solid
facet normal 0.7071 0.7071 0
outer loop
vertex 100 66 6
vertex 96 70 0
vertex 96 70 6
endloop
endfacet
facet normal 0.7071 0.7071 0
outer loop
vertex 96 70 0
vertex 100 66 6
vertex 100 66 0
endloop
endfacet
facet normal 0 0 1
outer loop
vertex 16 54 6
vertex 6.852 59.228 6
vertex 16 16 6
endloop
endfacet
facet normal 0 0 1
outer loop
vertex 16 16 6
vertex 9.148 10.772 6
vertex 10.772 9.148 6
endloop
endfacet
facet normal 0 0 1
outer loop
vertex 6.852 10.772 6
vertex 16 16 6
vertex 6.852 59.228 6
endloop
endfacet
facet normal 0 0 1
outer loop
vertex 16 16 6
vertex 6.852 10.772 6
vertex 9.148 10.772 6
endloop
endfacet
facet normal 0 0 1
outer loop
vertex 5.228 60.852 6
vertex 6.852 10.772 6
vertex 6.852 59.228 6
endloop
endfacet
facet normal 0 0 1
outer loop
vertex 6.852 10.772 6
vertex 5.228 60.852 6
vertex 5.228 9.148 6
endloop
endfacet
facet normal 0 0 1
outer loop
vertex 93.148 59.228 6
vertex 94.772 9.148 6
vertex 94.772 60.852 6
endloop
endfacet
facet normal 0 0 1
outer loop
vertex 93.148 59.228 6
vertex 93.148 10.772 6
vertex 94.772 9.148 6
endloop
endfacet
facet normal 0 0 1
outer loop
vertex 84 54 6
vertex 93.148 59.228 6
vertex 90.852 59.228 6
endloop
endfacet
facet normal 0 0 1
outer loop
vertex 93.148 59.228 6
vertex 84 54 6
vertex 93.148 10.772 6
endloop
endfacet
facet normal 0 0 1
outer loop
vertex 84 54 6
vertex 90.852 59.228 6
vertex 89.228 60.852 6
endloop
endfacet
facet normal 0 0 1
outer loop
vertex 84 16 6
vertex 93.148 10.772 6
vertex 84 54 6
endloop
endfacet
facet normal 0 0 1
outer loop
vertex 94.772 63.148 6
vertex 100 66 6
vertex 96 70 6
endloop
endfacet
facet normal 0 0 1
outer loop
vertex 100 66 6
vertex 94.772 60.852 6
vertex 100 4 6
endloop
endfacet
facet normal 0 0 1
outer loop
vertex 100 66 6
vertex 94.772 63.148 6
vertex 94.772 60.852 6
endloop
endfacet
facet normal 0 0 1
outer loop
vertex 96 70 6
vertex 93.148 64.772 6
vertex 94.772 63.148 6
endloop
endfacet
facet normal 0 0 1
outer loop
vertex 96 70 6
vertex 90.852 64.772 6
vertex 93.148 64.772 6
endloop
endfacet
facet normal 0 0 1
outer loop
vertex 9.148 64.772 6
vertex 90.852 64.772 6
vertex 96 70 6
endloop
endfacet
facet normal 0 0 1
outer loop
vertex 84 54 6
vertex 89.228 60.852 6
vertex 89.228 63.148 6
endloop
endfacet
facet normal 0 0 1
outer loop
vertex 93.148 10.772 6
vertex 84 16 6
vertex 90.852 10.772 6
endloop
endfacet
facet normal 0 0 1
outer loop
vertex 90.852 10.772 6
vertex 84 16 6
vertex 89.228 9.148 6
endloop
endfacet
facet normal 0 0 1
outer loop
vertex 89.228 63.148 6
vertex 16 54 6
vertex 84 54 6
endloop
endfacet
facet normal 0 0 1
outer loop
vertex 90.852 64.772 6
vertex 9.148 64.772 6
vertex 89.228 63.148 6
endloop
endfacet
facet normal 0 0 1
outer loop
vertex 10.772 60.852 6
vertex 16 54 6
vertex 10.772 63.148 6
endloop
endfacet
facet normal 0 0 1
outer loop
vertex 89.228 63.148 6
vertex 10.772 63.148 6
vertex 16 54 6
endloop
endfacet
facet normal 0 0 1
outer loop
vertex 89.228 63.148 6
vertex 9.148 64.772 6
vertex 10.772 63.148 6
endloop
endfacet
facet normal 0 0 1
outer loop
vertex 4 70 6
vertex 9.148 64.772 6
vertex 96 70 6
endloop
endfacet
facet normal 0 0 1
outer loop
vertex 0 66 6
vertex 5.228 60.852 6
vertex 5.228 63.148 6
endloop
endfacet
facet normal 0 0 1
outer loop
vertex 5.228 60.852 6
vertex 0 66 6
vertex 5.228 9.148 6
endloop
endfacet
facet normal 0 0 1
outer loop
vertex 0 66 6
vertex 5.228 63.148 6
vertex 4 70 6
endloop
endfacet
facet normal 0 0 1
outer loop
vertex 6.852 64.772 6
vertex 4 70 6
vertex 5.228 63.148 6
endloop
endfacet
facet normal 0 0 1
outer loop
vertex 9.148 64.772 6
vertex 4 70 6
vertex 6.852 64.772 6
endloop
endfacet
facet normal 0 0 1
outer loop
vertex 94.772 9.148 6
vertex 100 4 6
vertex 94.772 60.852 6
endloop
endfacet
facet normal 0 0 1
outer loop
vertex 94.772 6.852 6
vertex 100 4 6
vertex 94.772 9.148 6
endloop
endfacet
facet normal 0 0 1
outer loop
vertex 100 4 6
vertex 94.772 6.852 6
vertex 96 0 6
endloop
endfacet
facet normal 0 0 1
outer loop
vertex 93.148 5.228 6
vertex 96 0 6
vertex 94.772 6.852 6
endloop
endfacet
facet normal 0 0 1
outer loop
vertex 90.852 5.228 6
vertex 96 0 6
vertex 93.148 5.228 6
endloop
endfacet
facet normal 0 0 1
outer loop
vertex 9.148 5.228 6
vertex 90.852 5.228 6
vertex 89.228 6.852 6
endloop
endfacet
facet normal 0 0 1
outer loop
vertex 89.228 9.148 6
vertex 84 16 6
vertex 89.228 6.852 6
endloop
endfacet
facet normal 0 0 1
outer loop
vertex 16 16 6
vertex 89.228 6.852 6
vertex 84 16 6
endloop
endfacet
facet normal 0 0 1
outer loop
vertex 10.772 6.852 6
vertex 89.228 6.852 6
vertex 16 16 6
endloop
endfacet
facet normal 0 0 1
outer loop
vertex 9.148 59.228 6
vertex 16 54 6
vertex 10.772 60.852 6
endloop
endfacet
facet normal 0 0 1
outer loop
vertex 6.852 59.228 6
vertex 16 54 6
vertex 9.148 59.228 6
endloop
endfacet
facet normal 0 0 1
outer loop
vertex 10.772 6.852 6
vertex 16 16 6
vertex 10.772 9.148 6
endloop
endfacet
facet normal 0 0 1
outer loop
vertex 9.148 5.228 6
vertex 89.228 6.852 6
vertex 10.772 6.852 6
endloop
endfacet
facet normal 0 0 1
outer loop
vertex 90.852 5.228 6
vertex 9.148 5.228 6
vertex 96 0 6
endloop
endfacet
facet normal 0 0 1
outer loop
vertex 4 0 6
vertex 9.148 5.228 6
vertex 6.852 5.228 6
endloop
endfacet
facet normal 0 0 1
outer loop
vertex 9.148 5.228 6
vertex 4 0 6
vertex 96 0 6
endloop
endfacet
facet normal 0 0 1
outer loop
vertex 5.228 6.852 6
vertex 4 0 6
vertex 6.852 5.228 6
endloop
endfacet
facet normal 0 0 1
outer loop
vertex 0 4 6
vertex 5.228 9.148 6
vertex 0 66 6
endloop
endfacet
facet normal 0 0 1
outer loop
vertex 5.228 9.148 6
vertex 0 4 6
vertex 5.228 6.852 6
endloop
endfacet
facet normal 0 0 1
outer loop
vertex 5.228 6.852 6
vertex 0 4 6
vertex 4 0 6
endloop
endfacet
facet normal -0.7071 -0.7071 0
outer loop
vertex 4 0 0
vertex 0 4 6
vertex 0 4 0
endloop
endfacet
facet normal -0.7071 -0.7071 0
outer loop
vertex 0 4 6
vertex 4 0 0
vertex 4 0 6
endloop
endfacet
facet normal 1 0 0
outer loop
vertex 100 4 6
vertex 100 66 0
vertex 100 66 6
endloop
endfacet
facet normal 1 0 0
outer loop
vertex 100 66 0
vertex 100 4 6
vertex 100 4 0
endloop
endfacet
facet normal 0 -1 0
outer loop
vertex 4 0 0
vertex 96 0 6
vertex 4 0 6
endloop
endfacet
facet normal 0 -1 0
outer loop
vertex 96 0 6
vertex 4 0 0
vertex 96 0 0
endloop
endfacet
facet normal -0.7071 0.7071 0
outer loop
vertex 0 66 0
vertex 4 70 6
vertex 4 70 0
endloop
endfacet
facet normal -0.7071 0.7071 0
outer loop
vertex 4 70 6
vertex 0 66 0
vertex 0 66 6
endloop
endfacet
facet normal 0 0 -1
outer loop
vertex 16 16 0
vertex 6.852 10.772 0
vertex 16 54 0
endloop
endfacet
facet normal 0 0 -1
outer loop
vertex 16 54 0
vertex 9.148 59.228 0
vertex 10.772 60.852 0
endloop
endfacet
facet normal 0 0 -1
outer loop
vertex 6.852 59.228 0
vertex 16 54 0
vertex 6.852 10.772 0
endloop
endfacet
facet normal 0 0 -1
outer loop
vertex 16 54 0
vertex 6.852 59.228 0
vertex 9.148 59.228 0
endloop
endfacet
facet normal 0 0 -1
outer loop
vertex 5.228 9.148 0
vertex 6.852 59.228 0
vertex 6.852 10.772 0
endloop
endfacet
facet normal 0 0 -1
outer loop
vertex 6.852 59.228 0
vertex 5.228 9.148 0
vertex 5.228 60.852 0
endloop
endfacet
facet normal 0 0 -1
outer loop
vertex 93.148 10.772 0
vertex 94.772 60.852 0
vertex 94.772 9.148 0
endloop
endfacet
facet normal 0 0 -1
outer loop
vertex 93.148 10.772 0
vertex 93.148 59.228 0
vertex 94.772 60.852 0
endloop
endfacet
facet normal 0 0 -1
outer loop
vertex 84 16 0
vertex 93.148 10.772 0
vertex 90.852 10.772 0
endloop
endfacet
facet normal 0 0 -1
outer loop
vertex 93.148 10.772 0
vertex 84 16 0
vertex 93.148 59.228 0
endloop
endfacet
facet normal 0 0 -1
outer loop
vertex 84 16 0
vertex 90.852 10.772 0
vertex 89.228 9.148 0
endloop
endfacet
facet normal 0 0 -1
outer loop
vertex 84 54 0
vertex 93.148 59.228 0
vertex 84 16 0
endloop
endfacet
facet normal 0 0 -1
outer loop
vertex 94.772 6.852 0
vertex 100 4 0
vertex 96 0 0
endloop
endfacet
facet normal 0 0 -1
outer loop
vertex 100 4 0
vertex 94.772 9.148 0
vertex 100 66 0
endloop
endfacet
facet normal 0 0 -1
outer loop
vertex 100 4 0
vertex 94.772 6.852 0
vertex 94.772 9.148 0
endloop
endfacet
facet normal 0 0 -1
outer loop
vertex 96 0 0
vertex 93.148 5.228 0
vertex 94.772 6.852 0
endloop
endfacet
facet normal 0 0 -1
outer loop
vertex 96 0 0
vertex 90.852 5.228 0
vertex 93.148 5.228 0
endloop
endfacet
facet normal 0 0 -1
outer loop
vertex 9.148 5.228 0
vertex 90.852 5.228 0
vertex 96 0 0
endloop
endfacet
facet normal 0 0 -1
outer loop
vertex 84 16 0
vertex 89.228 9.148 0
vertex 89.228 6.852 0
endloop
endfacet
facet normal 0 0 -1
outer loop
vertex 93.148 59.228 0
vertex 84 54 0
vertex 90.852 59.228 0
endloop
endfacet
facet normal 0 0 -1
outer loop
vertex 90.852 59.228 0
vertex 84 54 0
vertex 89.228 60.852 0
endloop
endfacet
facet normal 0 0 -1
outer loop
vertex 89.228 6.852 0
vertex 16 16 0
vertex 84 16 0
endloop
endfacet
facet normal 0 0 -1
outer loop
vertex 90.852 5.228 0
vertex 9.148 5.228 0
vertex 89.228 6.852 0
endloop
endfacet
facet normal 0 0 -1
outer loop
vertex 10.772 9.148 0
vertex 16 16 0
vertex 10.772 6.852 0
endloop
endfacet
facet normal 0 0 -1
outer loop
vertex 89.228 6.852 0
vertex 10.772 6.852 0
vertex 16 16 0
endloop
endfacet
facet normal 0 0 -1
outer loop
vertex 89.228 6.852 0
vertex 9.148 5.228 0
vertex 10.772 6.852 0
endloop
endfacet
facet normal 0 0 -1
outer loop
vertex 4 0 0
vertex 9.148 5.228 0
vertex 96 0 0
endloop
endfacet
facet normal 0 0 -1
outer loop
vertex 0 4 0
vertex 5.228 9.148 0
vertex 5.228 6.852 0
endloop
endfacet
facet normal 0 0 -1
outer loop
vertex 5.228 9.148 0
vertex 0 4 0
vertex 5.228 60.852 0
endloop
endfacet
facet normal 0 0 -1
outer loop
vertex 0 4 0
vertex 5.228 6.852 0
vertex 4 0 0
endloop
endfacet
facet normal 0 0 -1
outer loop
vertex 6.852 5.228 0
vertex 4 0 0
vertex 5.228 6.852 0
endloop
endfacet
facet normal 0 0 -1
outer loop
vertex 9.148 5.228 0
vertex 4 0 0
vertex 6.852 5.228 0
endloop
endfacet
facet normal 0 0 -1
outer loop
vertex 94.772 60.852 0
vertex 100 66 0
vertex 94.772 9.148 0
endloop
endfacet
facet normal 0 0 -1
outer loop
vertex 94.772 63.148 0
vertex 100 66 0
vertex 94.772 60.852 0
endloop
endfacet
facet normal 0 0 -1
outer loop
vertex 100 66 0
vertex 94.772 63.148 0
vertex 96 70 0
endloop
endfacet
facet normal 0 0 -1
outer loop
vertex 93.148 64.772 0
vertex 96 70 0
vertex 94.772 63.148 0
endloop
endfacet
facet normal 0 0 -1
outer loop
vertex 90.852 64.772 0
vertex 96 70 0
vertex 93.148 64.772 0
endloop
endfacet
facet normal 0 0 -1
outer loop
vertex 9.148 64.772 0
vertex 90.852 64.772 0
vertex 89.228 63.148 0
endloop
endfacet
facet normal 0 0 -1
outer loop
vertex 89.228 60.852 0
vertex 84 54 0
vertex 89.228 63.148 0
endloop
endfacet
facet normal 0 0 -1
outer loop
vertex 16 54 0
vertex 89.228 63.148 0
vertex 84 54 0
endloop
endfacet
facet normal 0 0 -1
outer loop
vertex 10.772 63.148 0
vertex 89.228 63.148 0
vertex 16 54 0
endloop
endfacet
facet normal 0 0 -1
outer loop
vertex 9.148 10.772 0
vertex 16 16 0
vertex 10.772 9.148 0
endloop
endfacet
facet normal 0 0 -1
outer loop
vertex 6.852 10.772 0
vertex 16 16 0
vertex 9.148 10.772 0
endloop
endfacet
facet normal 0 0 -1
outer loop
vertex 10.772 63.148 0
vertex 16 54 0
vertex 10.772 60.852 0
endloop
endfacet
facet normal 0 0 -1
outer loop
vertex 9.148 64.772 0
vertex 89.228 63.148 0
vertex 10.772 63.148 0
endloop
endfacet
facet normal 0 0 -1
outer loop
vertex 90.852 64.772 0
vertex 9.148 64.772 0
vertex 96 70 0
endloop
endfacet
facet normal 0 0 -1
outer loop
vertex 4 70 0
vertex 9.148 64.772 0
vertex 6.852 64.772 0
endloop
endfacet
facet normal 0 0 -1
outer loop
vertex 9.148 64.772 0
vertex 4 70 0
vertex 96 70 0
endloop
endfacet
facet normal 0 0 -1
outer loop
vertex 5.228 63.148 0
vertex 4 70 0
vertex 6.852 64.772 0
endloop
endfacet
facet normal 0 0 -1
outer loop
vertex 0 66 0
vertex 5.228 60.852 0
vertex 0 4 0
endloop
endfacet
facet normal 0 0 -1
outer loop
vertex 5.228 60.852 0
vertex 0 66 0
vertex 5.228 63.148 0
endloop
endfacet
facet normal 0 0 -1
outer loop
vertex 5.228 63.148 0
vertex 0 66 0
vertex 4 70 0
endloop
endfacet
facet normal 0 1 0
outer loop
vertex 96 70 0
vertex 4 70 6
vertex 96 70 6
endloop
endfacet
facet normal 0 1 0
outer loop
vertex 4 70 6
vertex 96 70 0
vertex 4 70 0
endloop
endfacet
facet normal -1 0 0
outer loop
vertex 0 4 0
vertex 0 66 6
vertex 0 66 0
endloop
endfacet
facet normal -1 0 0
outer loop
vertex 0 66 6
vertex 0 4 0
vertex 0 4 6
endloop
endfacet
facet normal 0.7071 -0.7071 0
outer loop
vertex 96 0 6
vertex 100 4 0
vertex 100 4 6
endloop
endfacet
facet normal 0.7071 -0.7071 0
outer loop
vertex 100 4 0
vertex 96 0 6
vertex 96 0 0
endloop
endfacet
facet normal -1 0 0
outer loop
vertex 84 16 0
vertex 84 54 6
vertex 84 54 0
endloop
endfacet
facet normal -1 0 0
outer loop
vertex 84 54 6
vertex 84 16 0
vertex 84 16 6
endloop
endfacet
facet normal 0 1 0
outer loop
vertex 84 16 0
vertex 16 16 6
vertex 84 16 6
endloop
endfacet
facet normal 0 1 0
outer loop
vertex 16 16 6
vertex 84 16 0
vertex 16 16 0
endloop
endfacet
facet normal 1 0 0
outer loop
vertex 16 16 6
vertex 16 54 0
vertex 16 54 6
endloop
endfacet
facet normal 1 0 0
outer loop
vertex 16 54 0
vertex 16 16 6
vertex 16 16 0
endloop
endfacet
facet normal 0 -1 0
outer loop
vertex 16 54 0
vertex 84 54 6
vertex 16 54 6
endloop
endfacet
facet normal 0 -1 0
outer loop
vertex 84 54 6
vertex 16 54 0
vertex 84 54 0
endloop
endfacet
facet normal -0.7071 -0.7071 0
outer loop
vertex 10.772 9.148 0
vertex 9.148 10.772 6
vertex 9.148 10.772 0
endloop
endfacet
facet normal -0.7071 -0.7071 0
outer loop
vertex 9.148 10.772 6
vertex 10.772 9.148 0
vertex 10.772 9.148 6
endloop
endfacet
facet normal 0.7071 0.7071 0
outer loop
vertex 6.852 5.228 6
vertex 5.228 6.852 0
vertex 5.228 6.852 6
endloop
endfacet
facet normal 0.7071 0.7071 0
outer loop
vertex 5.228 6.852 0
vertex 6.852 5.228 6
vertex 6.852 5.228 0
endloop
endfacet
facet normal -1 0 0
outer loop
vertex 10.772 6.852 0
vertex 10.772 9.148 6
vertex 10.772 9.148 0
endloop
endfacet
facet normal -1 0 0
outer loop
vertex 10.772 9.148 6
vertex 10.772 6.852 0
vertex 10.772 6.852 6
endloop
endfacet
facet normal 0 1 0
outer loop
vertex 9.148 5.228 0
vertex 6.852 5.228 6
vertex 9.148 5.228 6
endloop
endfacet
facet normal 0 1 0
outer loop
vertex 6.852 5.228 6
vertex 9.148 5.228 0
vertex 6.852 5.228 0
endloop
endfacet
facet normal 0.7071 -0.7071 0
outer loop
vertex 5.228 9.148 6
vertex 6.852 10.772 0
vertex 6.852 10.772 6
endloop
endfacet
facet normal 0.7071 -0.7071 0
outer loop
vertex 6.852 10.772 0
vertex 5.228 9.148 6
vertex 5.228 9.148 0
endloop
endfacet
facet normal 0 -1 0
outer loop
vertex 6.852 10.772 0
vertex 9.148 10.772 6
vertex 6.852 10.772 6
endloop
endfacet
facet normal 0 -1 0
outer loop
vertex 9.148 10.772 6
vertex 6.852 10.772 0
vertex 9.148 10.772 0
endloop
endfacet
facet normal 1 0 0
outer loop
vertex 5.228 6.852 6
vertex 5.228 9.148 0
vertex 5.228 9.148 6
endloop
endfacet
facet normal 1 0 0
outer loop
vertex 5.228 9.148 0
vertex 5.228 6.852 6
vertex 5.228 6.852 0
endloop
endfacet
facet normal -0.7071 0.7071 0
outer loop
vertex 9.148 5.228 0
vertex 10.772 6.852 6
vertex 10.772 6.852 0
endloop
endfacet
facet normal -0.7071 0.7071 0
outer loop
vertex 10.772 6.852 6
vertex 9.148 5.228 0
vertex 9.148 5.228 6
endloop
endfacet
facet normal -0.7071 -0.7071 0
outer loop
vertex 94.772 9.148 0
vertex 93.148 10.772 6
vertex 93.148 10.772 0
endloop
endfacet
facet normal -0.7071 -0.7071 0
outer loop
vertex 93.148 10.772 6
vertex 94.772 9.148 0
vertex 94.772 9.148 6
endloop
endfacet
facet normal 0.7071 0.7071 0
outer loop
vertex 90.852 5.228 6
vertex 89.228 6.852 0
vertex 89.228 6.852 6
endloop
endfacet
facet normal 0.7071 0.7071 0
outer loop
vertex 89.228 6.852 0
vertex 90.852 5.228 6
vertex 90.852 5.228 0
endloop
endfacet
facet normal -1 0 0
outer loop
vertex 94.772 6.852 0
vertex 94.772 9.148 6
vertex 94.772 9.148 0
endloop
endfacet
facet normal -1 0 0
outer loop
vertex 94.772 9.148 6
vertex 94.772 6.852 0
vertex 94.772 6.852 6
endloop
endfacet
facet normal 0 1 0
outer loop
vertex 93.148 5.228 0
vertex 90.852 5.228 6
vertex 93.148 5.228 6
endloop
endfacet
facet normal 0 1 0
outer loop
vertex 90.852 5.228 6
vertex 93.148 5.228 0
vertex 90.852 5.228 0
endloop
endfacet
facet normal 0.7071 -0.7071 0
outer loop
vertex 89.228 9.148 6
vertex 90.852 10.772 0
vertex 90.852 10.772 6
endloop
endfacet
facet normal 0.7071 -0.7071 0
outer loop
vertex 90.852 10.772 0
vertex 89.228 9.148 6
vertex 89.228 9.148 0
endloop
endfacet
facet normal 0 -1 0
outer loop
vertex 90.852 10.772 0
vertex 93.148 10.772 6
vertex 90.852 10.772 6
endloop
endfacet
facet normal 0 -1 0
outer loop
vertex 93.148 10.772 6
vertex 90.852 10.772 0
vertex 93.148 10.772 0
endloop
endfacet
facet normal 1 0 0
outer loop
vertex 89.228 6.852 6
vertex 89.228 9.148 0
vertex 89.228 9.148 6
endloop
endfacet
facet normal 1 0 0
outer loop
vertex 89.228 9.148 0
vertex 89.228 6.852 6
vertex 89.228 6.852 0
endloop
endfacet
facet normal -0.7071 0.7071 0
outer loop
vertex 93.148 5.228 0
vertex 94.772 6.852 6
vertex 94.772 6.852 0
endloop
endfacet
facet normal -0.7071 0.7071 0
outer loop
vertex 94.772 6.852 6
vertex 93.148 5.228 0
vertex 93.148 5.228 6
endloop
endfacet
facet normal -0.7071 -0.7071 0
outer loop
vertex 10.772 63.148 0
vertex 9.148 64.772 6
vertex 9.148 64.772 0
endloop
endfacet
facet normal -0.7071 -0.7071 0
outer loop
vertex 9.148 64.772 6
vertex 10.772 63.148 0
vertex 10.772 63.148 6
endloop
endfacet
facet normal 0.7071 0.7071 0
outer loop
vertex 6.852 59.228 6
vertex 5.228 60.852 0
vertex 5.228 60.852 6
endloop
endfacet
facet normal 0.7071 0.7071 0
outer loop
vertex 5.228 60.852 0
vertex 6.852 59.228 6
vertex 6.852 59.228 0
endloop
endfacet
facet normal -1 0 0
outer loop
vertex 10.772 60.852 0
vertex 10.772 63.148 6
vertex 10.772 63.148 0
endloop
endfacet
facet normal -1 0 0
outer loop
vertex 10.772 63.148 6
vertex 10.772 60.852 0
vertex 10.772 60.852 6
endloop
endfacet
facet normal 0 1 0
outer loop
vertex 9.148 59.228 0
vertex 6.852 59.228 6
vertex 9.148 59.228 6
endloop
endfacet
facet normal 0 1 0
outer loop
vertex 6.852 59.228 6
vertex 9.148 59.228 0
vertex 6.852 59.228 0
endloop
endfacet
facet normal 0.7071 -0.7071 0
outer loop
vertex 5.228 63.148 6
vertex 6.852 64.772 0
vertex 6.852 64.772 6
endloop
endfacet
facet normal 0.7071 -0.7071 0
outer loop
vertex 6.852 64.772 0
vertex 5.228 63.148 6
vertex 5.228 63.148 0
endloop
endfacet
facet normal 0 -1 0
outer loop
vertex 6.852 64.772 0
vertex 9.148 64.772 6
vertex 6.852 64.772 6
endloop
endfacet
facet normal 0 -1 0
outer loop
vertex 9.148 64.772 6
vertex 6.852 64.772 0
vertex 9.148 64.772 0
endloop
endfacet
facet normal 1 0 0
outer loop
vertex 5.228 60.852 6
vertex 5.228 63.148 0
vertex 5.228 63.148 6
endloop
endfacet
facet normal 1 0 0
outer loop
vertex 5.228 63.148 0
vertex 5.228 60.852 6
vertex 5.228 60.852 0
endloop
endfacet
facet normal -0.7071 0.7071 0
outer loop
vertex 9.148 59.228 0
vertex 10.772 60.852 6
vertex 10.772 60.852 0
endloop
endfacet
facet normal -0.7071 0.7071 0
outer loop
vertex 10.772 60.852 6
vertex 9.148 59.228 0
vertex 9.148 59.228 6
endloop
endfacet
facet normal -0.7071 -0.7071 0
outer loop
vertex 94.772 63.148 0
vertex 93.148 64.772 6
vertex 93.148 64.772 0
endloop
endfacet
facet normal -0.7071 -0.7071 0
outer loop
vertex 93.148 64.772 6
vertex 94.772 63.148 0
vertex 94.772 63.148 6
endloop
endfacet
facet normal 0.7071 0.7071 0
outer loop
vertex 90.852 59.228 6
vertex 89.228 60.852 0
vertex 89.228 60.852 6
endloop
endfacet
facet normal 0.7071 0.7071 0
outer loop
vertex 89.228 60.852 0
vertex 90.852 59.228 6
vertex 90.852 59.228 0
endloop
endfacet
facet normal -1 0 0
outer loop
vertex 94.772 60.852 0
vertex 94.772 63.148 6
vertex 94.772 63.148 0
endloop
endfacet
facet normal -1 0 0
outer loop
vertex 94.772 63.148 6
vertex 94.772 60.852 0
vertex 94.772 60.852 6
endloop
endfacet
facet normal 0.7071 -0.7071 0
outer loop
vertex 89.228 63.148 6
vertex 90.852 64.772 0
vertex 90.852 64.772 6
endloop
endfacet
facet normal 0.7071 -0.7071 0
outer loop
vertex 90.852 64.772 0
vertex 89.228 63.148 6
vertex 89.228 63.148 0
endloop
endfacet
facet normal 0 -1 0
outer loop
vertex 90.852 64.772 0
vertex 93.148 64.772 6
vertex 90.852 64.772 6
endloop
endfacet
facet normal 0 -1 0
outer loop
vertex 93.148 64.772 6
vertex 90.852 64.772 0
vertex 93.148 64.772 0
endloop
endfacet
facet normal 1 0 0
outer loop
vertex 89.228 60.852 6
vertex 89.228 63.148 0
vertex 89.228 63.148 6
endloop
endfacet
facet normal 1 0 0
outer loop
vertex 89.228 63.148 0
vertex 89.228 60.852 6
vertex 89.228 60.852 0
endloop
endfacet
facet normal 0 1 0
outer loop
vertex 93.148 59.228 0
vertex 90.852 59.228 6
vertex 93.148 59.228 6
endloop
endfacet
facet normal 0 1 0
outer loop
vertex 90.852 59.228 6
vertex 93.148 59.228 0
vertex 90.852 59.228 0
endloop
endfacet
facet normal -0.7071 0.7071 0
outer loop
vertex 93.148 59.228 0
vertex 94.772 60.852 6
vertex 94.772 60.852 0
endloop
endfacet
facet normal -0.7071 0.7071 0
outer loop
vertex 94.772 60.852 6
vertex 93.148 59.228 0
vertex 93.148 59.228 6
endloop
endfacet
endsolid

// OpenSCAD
$fn = 32;

// ----------------------------------------------------------------------
// Frame plate: 100 x 70 frame, 16 mm rails
// ----------------------------------------------------------------------

// --- parameters (mm) ---
plate_l = 100;            // plate length, X
plate_w = 70;             // plate width, Y
plate_t = 6;              // plate thickness, Z (extrusion height)
corner_c = 4;             // corner chamfer
frame_bar = 16;           // frame rail width
bolt_r = 3;               // corner bolt window radius
bolt_inset = 8;           // bolt centre inset from the edges

win_l = plate_l - 2 * frame_bar;  // window length
win_w = plate_w - 2 * frame_bar;  // window width
bolt_d = 2 * bolt_r;  // corner hole diameter

profile = [[4, 0], [96, 0], [100, 4], [100, 66], [96, 70], [4, 70], [0, 66], [0, 4]];  // primary outline, 8 points, counter clockwise
void_1 = [[16, 16], [84, 16], [84, 54], [16, 54]];  // the window, 4 points
void_2 = [[10.772, 9.148], [9.148, 10.772], [6.852, 10.772], [5.228, 9.148], [5.228, 6.852], [6.852, 5.228], [9.148, 5.228], [10.772, 6.852]];  // corner bolt window, 8 points
void_3 = [[94.772, 9.148], [93.148, 10.772], [90.852, 10.772], [89.228, 9.148], [89.228, 6.852], [90.852, 5.228], [93.148, 5.228], [94.772, 6.852]];  // corner bolt window, 8 points
void_4 = [[10.772, 63.148], [9.148, 64.772], [6.852, 64.772], [5.228, 63.148], [5.228, 60.852], [6.852, 59.228], [9.148, 59.228], [10.772, 60.852]];  // corner bolt window, 8 points
void_5 = [[94.772, 63.148], [93.148, 64.772], [90.852, 64.772], [89.228, 63.148], [89.228, 60.852], [90.852, 59.228], [93.148, 59.228], [94.772, 60.852]];  // corner bolt window, 8 points

// --- the one profile operation ---
difference() {
  linear_extrude(height = plate_t) polygon(points = profile);
  translate([0, 0, -1])
    linear_extrude(height = plate_t + 2) polygon(points = void_1);
  translate([0, 0, -1])
    linear_extrude(height = plate_t + 2) polygon(points = void_2);
  translate([0, 0, -1])
    linear_extrude(height = plate_t + 2) polygon(points = void_3);
  translate([0, 0, -1])
    linear_extrude(height = plate_t + 2) polygon(points = void_4);
  translate([0, 0, -1])
    linear_extrude(height = plate_t + 2) polygon(points = void_5);
}
